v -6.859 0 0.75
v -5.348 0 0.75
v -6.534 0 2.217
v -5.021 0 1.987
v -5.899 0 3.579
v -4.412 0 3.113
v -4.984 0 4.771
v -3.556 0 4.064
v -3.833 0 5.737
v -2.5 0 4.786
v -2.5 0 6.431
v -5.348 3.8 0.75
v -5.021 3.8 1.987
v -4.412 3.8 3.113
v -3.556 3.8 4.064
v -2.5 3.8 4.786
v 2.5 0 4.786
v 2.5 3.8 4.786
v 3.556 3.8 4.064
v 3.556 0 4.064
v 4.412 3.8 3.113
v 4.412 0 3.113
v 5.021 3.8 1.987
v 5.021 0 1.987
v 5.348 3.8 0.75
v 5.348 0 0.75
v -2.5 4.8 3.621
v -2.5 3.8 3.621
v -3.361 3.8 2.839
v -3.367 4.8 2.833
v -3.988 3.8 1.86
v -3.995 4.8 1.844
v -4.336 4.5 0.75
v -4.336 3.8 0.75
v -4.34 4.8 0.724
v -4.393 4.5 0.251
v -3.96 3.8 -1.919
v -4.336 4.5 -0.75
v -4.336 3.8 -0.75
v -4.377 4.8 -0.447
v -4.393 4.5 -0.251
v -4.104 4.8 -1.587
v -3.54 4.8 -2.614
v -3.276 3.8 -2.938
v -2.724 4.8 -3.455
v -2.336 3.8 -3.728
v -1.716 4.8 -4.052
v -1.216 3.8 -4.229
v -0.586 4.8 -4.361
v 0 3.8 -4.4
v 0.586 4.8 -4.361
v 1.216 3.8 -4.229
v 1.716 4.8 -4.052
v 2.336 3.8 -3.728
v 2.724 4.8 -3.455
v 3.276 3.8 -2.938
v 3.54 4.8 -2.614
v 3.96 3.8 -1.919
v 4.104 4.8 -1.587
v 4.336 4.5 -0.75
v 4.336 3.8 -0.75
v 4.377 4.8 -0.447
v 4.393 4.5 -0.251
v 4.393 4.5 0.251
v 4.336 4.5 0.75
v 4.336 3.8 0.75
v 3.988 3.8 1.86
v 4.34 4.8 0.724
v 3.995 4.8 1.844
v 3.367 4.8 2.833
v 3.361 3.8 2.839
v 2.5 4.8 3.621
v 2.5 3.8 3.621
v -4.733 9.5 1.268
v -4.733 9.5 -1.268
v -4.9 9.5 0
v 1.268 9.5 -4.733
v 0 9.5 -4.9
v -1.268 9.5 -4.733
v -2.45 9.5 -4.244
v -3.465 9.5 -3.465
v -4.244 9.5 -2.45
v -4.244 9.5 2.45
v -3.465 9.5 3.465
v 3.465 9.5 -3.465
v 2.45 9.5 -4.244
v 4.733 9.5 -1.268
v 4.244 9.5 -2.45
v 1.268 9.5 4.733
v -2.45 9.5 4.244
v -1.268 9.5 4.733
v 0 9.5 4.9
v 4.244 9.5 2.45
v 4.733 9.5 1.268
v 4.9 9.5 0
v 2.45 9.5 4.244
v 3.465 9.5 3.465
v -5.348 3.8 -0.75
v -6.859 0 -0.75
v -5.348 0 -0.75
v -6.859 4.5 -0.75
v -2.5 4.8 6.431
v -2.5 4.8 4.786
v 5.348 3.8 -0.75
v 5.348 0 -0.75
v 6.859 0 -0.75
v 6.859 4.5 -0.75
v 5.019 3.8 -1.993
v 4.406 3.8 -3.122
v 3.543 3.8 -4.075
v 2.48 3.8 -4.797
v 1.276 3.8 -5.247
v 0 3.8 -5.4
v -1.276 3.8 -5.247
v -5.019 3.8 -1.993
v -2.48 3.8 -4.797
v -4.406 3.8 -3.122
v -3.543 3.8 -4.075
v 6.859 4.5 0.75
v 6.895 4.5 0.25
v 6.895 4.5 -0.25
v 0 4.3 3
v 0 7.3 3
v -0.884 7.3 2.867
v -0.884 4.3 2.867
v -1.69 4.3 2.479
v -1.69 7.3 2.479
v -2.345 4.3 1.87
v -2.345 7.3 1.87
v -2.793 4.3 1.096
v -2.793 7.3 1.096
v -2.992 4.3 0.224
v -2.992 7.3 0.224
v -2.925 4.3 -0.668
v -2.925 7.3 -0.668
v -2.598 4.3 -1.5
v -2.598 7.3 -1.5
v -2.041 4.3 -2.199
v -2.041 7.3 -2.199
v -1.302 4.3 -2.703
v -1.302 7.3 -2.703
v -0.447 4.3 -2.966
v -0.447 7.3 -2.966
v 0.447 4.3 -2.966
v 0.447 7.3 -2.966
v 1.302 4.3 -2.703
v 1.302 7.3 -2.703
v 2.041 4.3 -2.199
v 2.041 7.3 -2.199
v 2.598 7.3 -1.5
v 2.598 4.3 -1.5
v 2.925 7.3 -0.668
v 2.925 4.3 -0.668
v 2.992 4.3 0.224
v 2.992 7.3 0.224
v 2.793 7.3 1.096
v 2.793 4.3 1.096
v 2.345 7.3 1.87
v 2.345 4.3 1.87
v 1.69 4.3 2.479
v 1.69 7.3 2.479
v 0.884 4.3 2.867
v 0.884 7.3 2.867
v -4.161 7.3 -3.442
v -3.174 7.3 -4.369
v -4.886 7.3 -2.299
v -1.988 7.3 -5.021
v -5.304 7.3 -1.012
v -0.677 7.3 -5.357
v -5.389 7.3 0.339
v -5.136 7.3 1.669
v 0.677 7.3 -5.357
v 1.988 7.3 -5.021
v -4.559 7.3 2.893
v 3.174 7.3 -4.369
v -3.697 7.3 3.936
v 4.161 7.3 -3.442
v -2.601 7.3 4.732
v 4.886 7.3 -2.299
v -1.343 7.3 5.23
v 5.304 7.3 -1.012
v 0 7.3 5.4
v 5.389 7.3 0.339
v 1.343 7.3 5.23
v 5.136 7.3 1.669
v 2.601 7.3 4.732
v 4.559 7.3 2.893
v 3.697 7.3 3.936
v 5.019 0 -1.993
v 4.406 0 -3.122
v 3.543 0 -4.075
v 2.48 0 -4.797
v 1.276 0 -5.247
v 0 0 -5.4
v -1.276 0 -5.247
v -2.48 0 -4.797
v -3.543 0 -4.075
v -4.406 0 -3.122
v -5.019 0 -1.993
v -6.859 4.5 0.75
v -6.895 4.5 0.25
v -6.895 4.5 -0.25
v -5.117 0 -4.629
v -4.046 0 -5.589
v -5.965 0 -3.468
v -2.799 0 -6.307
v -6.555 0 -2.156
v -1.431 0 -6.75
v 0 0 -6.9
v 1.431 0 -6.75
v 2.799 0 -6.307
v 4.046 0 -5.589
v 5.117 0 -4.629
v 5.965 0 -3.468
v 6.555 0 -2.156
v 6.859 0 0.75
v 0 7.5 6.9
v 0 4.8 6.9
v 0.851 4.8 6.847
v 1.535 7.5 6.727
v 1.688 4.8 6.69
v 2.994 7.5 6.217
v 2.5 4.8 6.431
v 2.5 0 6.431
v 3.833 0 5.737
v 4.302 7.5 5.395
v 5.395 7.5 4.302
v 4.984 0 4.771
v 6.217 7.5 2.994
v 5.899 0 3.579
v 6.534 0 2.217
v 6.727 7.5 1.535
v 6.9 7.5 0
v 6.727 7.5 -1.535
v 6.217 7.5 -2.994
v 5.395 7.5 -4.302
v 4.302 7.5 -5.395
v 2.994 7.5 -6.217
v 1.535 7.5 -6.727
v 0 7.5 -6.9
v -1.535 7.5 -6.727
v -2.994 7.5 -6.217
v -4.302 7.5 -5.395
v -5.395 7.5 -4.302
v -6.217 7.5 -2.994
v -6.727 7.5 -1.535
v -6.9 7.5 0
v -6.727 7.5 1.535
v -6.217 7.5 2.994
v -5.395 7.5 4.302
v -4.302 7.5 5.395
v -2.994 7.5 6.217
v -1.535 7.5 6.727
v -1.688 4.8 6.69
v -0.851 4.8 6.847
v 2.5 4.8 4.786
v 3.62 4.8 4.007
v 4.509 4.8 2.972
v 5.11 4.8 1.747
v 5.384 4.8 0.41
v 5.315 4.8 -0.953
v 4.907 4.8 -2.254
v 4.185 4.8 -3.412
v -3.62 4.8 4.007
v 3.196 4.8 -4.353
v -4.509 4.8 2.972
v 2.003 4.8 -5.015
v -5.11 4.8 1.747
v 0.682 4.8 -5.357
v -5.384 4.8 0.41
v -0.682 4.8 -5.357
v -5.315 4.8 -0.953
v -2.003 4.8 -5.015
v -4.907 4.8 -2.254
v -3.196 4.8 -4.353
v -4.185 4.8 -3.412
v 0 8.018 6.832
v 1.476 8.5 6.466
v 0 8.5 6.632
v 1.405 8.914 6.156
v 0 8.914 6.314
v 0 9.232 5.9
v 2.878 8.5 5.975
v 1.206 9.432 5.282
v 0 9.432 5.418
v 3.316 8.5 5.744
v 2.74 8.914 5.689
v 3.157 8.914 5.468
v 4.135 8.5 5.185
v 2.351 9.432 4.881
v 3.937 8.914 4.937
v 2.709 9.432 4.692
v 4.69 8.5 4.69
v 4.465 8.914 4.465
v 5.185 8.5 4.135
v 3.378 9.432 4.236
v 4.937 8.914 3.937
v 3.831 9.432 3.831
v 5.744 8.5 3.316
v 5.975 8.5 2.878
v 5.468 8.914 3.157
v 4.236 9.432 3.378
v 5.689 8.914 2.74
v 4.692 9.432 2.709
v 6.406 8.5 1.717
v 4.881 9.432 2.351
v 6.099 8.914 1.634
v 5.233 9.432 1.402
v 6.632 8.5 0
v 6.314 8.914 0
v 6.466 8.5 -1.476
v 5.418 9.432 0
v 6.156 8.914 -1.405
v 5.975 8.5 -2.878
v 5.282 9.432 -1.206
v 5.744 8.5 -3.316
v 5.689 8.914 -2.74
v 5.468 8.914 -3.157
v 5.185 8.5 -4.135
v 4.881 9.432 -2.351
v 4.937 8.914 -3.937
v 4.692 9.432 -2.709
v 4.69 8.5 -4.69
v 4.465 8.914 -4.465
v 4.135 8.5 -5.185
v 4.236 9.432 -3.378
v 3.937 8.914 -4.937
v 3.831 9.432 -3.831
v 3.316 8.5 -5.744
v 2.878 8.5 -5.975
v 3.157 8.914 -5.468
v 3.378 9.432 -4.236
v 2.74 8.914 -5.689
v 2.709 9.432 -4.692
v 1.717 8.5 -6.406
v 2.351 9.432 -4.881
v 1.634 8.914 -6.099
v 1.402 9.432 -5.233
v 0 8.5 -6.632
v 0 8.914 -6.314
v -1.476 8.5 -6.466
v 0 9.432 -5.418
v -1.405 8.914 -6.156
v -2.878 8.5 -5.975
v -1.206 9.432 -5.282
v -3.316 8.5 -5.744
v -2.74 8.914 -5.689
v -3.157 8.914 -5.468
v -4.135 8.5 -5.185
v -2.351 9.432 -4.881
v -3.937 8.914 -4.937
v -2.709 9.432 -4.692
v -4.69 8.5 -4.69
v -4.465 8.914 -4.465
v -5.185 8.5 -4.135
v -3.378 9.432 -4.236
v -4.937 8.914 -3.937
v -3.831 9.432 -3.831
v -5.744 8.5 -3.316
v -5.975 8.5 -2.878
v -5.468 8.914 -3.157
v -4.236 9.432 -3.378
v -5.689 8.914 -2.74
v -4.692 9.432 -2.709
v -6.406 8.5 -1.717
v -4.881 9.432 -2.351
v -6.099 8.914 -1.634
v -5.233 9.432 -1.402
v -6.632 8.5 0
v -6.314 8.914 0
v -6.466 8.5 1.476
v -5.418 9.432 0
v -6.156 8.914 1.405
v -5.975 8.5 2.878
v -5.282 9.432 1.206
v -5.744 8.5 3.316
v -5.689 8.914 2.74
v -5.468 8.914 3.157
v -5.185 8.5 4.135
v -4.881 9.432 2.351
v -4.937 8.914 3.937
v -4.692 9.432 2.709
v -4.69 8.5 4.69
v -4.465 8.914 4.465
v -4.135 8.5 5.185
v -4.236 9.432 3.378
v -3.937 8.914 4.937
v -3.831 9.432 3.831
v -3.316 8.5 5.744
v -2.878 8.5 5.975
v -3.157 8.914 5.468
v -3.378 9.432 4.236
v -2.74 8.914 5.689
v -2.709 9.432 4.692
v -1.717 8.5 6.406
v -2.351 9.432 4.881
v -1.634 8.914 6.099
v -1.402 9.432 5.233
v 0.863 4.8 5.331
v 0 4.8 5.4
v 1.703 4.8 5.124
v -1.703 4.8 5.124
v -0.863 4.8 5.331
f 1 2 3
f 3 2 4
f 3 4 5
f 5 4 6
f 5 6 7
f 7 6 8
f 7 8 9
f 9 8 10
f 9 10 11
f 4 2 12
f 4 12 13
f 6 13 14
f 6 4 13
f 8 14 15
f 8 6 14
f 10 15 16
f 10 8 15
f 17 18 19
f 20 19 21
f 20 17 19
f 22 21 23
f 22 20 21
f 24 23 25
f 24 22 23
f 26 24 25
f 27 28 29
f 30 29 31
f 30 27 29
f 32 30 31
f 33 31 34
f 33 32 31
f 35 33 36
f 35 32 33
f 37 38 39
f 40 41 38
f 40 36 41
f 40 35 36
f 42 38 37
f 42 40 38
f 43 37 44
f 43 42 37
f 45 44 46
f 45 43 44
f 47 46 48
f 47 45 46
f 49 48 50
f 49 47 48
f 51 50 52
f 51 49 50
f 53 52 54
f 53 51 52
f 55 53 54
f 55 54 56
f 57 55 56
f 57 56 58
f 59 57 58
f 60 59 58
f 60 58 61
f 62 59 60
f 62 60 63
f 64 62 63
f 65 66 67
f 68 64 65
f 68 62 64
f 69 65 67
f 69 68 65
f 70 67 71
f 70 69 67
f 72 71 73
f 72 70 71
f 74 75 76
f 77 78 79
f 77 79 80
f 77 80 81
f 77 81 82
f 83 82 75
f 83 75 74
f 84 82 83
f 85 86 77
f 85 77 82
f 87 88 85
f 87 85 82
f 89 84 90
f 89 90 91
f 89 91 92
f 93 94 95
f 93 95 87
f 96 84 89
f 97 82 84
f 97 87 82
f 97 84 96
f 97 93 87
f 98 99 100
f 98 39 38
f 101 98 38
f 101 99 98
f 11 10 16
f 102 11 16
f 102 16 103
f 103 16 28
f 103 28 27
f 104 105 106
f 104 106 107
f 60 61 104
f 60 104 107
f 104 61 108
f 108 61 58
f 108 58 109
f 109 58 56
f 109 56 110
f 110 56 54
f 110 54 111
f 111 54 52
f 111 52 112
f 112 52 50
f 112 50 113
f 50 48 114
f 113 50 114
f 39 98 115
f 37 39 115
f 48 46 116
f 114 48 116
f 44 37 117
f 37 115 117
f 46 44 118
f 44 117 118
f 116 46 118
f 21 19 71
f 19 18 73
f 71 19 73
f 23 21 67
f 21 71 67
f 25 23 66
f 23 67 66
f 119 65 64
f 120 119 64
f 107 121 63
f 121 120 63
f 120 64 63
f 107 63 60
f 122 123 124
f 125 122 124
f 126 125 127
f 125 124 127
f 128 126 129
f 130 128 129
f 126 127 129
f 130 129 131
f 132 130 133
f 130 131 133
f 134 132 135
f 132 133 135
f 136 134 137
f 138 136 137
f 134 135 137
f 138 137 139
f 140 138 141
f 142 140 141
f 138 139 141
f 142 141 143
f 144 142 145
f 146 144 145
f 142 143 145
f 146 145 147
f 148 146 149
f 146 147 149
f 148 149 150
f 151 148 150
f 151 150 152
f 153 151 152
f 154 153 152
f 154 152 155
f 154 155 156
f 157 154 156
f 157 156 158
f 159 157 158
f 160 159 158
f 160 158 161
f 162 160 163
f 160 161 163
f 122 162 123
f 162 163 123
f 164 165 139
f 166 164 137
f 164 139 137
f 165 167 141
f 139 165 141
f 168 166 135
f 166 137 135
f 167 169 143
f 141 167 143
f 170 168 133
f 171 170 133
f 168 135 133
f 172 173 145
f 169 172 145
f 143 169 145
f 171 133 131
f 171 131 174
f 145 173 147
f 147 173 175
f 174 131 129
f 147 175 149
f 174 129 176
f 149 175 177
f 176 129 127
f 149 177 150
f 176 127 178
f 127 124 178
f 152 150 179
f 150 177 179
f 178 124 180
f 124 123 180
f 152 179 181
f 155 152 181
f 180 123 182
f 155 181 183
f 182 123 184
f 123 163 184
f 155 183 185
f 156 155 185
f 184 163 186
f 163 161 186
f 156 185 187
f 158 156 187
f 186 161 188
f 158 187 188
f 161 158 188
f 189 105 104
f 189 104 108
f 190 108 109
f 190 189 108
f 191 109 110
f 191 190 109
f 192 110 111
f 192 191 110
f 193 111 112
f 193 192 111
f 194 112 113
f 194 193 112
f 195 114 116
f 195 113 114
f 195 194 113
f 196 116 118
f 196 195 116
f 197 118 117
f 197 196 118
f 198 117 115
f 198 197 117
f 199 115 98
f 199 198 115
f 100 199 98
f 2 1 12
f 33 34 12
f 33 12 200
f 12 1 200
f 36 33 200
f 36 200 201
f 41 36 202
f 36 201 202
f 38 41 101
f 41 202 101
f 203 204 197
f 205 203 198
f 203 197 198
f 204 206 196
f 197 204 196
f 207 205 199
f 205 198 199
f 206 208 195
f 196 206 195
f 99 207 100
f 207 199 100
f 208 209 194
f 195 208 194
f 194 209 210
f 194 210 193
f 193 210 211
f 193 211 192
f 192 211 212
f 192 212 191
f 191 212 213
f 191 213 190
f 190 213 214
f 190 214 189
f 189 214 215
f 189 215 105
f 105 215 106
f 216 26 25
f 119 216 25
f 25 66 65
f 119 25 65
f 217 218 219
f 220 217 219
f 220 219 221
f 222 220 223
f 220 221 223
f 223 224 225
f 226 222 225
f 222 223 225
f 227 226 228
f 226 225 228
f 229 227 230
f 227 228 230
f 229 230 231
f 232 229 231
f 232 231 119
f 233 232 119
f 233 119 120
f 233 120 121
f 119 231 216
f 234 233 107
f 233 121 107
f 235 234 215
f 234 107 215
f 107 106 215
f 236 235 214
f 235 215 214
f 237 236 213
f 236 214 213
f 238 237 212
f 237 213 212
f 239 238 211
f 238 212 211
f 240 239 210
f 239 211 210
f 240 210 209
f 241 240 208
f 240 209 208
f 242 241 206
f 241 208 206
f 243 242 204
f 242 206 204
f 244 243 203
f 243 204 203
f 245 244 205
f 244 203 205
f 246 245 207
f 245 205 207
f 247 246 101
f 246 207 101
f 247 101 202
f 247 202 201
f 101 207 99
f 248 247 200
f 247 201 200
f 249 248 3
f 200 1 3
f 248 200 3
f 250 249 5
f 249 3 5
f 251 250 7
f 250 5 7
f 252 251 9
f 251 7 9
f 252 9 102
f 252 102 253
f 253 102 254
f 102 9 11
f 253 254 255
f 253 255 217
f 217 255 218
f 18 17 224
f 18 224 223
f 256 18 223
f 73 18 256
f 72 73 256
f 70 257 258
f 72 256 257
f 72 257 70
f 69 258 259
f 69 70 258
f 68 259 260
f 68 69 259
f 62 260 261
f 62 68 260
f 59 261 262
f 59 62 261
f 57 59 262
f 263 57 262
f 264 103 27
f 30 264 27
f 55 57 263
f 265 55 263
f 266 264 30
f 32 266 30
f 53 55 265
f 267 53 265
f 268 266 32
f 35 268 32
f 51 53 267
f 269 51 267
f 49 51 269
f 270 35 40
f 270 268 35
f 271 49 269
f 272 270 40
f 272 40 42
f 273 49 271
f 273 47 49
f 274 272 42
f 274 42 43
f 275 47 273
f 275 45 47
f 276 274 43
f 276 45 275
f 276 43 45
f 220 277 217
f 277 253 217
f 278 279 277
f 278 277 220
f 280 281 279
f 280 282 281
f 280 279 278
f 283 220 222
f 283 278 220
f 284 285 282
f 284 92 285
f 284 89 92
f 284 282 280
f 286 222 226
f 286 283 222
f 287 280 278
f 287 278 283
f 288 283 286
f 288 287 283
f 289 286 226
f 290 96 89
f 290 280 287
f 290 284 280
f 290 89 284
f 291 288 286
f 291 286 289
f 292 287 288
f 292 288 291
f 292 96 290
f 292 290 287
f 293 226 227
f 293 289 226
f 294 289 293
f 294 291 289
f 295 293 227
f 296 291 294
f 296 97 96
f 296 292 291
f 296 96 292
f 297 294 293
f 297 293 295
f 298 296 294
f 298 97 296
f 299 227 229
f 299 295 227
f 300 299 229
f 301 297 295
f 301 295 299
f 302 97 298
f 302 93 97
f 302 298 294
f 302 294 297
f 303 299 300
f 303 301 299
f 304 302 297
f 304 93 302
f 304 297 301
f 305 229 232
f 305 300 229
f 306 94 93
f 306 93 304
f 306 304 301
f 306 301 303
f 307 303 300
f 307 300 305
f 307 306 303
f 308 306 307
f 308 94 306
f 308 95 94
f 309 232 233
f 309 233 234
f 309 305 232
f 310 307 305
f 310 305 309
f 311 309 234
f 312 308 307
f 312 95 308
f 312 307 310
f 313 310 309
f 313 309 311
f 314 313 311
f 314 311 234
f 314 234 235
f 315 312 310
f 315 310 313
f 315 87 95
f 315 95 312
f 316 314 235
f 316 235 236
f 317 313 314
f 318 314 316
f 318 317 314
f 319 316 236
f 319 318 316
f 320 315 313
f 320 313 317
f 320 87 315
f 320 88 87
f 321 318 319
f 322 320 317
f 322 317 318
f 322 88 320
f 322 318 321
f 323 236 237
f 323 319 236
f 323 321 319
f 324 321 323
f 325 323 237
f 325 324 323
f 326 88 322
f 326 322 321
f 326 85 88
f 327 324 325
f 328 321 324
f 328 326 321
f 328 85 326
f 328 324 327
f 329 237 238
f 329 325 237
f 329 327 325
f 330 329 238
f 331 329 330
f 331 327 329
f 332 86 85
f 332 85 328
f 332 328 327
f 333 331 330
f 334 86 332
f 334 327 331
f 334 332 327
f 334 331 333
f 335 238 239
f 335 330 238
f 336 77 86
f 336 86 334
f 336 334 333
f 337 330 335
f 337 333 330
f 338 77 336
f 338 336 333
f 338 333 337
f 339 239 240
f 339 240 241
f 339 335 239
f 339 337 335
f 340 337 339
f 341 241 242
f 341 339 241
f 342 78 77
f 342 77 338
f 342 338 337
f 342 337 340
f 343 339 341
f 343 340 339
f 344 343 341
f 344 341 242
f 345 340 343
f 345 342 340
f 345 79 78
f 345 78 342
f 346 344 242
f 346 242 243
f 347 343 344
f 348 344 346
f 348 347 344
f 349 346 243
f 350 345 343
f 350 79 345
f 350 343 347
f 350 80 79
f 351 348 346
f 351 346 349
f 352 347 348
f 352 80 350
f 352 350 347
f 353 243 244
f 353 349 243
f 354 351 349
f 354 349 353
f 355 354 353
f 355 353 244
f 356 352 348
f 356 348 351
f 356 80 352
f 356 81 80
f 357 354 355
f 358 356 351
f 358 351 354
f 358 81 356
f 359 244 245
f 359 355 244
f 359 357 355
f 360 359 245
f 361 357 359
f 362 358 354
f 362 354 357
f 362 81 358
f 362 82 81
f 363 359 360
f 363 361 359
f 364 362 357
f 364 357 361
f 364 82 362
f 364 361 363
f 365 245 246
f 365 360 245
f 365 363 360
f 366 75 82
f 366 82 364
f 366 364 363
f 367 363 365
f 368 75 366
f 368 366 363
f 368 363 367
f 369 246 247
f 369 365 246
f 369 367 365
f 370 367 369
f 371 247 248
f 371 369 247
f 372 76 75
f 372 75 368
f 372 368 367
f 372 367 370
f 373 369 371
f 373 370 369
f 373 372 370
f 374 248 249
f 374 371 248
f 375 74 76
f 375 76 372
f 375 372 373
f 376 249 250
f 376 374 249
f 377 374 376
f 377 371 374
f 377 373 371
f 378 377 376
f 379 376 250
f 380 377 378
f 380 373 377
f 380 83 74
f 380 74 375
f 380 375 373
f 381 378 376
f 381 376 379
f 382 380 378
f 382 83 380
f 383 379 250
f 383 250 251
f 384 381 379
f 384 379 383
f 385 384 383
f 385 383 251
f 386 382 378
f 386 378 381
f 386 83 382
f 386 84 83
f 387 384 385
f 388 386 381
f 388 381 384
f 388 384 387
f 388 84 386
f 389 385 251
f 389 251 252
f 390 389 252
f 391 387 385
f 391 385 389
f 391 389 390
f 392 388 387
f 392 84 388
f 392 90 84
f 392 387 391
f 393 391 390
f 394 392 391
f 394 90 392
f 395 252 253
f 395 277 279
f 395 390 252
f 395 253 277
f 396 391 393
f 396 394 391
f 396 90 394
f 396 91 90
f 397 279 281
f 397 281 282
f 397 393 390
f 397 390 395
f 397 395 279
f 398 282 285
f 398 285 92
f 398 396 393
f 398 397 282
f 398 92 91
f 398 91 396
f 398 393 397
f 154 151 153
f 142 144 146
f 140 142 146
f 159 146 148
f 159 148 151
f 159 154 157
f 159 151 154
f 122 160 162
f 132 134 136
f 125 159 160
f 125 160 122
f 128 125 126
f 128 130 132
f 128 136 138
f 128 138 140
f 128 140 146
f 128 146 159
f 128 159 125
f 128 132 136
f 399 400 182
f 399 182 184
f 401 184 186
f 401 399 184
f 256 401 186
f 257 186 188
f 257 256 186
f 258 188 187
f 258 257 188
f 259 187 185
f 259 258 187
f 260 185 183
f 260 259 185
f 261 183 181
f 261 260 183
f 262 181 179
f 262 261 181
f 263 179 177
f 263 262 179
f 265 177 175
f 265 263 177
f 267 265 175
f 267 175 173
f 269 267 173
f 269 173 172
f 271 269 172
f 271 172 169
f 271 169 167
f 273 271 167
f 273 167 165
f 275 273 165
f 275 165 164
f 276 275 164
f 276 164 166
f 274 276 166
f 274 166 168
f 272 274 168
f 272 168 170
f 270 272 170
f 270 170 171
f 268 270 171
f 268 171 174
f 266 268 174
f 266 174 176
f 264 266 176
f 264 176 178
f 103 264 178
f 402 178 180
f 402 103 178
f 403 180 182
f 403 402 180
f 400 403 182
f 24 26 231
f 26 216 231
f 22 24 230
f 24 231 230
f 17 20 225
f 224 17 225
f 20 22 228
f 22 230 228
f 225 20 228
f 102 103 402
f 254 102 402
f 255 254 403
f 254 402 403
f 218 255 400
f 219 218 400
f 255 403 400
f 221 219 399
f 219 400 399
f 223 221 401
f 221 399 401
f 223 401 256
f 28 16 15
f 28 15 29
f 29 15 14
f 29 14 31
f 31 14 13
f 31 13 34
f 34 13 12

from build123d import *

# Parameters (mm, degrees)
SKETCH1_R               = 6.9
SKETCH1_R_2             = 5.4
BOSS_EXTRUDE1_DEPTH     = 7.3
SKETCH2_R               = 6.9
BOSS_EXTRUDE2_DEPTH     = 2.2
FILLET1_R               = 2
SKETCH6_W               = 1.1
SKETCH6_H               = 1
SKETCH4_W               = 5
SKETCH4_H               = 4.8
CUT_EXTRUDE1_DEPTH      = 14.618737093
CUT_EXTRUDE2_DEPTH      = 14.618737093
CUT_EXTRUDE2_DEPTH_BACK = 14.618737093
SKETCH5_W               = 1.5
SKETCH5_H               = 4.5
SKETCH3_R               = 3
BOSS_EXTRUDE3_DEPTH     = 3


with BuildPart() as part:
    # Sketch1 → Boss-Extrude1 (new body)
    with BuildSketch(Plane(origin=(0, 0, 0), x_dir=(1, 0, 0), z_dir=(0, 1, 0))):
        with Locations(Location((0, 0, 0), (0, 0, 270))):
            Circle(SKETCH1_R)
        with Locations(Location((0, 0, 0), (0, 0, 270))):
            Circle(SKETCH1_R_2, mode=Mode.SUBTRACT)
    extrude(amount=BOSS_EXTRUDE1_DEPTH)

    # Sketch2 → Boss-Extrude2 (add)
    with BuildSketch(Plane(origin=(0, 7.3, 0), x_dir=(1, 0, 0), z_dir=(0, 1, 0))):
        with Locations(Location((0, 0, 0), (0, 0, 270))):
            Circle(SKETCH2_R)
    extrude(amount=BOSS_EXTRUDE2_DEPTH)

    # Fillet1
    fillet1_edges = [part.edges().sort_by_distance(p)[0] for p in [
        (0, 9.5, -6.9),
    ]]
    fillet(fillet1_edges, radius=FILLET1_R)

    # Sketch6 → Revolve3 (revolve)
    with BuildSketch(Plane.XY, mode=Mode.PRIVATE) as revolve3_sk:
        with Locations((4.95, 4.3)):
            Rectangle(SKETCH6_W, SKETCH6_H)
    revolve(revolve3_sk.sketch.rotate(Axis((0, 9.975, 0), (0, -1, 0)), 90), axis=Axis((0, 9.975, 0), (0, -1, 0)))

    # Sketch4 → Cut-Extrude1 (cut, through all)
    with BuildSketch(Plane.XY):
        with Locations((0, 2.4)):
            Rectangle(SKETCH4_W, SKETCH4_H)
    extrude(amount=CUT_EXTRUDE1_DEPTH, mode=Mode.SUBTRACT)

    # Sketch5 → Cut-Extrude2 (cut, two sides: drawn at the far end of the back side and taken through both)
    with BuildSketch(Plane(origin=(0, 0, 0), x_dir=(0, 0, -1), z_dir=(1, 0, 0)).offset(-CUT_EXTRUDE2_DEPTH_BACK)):
        with Locations((0, 2.25)):
            Rectangle(SKETCH5_W, SKETCH5_H)
    extrude(amount=CUT_EXTRUDE2_DEPTH + CUT_EXTRUDE2_DEPTH_BACK, mode=Mode.SUBTRACT)

    # Sketch3 → Boss-Extrude3 (add)
    with BuildSketch(Plane.XZ.offset(-7.3)):
        with Locations(Location((0, 0, 0), (0, 0, 90))):
            Circle(SKETCH3_R)
    extrude(amount=BOSS_EXTRUDE3_DEPTH)


solid = part.part
